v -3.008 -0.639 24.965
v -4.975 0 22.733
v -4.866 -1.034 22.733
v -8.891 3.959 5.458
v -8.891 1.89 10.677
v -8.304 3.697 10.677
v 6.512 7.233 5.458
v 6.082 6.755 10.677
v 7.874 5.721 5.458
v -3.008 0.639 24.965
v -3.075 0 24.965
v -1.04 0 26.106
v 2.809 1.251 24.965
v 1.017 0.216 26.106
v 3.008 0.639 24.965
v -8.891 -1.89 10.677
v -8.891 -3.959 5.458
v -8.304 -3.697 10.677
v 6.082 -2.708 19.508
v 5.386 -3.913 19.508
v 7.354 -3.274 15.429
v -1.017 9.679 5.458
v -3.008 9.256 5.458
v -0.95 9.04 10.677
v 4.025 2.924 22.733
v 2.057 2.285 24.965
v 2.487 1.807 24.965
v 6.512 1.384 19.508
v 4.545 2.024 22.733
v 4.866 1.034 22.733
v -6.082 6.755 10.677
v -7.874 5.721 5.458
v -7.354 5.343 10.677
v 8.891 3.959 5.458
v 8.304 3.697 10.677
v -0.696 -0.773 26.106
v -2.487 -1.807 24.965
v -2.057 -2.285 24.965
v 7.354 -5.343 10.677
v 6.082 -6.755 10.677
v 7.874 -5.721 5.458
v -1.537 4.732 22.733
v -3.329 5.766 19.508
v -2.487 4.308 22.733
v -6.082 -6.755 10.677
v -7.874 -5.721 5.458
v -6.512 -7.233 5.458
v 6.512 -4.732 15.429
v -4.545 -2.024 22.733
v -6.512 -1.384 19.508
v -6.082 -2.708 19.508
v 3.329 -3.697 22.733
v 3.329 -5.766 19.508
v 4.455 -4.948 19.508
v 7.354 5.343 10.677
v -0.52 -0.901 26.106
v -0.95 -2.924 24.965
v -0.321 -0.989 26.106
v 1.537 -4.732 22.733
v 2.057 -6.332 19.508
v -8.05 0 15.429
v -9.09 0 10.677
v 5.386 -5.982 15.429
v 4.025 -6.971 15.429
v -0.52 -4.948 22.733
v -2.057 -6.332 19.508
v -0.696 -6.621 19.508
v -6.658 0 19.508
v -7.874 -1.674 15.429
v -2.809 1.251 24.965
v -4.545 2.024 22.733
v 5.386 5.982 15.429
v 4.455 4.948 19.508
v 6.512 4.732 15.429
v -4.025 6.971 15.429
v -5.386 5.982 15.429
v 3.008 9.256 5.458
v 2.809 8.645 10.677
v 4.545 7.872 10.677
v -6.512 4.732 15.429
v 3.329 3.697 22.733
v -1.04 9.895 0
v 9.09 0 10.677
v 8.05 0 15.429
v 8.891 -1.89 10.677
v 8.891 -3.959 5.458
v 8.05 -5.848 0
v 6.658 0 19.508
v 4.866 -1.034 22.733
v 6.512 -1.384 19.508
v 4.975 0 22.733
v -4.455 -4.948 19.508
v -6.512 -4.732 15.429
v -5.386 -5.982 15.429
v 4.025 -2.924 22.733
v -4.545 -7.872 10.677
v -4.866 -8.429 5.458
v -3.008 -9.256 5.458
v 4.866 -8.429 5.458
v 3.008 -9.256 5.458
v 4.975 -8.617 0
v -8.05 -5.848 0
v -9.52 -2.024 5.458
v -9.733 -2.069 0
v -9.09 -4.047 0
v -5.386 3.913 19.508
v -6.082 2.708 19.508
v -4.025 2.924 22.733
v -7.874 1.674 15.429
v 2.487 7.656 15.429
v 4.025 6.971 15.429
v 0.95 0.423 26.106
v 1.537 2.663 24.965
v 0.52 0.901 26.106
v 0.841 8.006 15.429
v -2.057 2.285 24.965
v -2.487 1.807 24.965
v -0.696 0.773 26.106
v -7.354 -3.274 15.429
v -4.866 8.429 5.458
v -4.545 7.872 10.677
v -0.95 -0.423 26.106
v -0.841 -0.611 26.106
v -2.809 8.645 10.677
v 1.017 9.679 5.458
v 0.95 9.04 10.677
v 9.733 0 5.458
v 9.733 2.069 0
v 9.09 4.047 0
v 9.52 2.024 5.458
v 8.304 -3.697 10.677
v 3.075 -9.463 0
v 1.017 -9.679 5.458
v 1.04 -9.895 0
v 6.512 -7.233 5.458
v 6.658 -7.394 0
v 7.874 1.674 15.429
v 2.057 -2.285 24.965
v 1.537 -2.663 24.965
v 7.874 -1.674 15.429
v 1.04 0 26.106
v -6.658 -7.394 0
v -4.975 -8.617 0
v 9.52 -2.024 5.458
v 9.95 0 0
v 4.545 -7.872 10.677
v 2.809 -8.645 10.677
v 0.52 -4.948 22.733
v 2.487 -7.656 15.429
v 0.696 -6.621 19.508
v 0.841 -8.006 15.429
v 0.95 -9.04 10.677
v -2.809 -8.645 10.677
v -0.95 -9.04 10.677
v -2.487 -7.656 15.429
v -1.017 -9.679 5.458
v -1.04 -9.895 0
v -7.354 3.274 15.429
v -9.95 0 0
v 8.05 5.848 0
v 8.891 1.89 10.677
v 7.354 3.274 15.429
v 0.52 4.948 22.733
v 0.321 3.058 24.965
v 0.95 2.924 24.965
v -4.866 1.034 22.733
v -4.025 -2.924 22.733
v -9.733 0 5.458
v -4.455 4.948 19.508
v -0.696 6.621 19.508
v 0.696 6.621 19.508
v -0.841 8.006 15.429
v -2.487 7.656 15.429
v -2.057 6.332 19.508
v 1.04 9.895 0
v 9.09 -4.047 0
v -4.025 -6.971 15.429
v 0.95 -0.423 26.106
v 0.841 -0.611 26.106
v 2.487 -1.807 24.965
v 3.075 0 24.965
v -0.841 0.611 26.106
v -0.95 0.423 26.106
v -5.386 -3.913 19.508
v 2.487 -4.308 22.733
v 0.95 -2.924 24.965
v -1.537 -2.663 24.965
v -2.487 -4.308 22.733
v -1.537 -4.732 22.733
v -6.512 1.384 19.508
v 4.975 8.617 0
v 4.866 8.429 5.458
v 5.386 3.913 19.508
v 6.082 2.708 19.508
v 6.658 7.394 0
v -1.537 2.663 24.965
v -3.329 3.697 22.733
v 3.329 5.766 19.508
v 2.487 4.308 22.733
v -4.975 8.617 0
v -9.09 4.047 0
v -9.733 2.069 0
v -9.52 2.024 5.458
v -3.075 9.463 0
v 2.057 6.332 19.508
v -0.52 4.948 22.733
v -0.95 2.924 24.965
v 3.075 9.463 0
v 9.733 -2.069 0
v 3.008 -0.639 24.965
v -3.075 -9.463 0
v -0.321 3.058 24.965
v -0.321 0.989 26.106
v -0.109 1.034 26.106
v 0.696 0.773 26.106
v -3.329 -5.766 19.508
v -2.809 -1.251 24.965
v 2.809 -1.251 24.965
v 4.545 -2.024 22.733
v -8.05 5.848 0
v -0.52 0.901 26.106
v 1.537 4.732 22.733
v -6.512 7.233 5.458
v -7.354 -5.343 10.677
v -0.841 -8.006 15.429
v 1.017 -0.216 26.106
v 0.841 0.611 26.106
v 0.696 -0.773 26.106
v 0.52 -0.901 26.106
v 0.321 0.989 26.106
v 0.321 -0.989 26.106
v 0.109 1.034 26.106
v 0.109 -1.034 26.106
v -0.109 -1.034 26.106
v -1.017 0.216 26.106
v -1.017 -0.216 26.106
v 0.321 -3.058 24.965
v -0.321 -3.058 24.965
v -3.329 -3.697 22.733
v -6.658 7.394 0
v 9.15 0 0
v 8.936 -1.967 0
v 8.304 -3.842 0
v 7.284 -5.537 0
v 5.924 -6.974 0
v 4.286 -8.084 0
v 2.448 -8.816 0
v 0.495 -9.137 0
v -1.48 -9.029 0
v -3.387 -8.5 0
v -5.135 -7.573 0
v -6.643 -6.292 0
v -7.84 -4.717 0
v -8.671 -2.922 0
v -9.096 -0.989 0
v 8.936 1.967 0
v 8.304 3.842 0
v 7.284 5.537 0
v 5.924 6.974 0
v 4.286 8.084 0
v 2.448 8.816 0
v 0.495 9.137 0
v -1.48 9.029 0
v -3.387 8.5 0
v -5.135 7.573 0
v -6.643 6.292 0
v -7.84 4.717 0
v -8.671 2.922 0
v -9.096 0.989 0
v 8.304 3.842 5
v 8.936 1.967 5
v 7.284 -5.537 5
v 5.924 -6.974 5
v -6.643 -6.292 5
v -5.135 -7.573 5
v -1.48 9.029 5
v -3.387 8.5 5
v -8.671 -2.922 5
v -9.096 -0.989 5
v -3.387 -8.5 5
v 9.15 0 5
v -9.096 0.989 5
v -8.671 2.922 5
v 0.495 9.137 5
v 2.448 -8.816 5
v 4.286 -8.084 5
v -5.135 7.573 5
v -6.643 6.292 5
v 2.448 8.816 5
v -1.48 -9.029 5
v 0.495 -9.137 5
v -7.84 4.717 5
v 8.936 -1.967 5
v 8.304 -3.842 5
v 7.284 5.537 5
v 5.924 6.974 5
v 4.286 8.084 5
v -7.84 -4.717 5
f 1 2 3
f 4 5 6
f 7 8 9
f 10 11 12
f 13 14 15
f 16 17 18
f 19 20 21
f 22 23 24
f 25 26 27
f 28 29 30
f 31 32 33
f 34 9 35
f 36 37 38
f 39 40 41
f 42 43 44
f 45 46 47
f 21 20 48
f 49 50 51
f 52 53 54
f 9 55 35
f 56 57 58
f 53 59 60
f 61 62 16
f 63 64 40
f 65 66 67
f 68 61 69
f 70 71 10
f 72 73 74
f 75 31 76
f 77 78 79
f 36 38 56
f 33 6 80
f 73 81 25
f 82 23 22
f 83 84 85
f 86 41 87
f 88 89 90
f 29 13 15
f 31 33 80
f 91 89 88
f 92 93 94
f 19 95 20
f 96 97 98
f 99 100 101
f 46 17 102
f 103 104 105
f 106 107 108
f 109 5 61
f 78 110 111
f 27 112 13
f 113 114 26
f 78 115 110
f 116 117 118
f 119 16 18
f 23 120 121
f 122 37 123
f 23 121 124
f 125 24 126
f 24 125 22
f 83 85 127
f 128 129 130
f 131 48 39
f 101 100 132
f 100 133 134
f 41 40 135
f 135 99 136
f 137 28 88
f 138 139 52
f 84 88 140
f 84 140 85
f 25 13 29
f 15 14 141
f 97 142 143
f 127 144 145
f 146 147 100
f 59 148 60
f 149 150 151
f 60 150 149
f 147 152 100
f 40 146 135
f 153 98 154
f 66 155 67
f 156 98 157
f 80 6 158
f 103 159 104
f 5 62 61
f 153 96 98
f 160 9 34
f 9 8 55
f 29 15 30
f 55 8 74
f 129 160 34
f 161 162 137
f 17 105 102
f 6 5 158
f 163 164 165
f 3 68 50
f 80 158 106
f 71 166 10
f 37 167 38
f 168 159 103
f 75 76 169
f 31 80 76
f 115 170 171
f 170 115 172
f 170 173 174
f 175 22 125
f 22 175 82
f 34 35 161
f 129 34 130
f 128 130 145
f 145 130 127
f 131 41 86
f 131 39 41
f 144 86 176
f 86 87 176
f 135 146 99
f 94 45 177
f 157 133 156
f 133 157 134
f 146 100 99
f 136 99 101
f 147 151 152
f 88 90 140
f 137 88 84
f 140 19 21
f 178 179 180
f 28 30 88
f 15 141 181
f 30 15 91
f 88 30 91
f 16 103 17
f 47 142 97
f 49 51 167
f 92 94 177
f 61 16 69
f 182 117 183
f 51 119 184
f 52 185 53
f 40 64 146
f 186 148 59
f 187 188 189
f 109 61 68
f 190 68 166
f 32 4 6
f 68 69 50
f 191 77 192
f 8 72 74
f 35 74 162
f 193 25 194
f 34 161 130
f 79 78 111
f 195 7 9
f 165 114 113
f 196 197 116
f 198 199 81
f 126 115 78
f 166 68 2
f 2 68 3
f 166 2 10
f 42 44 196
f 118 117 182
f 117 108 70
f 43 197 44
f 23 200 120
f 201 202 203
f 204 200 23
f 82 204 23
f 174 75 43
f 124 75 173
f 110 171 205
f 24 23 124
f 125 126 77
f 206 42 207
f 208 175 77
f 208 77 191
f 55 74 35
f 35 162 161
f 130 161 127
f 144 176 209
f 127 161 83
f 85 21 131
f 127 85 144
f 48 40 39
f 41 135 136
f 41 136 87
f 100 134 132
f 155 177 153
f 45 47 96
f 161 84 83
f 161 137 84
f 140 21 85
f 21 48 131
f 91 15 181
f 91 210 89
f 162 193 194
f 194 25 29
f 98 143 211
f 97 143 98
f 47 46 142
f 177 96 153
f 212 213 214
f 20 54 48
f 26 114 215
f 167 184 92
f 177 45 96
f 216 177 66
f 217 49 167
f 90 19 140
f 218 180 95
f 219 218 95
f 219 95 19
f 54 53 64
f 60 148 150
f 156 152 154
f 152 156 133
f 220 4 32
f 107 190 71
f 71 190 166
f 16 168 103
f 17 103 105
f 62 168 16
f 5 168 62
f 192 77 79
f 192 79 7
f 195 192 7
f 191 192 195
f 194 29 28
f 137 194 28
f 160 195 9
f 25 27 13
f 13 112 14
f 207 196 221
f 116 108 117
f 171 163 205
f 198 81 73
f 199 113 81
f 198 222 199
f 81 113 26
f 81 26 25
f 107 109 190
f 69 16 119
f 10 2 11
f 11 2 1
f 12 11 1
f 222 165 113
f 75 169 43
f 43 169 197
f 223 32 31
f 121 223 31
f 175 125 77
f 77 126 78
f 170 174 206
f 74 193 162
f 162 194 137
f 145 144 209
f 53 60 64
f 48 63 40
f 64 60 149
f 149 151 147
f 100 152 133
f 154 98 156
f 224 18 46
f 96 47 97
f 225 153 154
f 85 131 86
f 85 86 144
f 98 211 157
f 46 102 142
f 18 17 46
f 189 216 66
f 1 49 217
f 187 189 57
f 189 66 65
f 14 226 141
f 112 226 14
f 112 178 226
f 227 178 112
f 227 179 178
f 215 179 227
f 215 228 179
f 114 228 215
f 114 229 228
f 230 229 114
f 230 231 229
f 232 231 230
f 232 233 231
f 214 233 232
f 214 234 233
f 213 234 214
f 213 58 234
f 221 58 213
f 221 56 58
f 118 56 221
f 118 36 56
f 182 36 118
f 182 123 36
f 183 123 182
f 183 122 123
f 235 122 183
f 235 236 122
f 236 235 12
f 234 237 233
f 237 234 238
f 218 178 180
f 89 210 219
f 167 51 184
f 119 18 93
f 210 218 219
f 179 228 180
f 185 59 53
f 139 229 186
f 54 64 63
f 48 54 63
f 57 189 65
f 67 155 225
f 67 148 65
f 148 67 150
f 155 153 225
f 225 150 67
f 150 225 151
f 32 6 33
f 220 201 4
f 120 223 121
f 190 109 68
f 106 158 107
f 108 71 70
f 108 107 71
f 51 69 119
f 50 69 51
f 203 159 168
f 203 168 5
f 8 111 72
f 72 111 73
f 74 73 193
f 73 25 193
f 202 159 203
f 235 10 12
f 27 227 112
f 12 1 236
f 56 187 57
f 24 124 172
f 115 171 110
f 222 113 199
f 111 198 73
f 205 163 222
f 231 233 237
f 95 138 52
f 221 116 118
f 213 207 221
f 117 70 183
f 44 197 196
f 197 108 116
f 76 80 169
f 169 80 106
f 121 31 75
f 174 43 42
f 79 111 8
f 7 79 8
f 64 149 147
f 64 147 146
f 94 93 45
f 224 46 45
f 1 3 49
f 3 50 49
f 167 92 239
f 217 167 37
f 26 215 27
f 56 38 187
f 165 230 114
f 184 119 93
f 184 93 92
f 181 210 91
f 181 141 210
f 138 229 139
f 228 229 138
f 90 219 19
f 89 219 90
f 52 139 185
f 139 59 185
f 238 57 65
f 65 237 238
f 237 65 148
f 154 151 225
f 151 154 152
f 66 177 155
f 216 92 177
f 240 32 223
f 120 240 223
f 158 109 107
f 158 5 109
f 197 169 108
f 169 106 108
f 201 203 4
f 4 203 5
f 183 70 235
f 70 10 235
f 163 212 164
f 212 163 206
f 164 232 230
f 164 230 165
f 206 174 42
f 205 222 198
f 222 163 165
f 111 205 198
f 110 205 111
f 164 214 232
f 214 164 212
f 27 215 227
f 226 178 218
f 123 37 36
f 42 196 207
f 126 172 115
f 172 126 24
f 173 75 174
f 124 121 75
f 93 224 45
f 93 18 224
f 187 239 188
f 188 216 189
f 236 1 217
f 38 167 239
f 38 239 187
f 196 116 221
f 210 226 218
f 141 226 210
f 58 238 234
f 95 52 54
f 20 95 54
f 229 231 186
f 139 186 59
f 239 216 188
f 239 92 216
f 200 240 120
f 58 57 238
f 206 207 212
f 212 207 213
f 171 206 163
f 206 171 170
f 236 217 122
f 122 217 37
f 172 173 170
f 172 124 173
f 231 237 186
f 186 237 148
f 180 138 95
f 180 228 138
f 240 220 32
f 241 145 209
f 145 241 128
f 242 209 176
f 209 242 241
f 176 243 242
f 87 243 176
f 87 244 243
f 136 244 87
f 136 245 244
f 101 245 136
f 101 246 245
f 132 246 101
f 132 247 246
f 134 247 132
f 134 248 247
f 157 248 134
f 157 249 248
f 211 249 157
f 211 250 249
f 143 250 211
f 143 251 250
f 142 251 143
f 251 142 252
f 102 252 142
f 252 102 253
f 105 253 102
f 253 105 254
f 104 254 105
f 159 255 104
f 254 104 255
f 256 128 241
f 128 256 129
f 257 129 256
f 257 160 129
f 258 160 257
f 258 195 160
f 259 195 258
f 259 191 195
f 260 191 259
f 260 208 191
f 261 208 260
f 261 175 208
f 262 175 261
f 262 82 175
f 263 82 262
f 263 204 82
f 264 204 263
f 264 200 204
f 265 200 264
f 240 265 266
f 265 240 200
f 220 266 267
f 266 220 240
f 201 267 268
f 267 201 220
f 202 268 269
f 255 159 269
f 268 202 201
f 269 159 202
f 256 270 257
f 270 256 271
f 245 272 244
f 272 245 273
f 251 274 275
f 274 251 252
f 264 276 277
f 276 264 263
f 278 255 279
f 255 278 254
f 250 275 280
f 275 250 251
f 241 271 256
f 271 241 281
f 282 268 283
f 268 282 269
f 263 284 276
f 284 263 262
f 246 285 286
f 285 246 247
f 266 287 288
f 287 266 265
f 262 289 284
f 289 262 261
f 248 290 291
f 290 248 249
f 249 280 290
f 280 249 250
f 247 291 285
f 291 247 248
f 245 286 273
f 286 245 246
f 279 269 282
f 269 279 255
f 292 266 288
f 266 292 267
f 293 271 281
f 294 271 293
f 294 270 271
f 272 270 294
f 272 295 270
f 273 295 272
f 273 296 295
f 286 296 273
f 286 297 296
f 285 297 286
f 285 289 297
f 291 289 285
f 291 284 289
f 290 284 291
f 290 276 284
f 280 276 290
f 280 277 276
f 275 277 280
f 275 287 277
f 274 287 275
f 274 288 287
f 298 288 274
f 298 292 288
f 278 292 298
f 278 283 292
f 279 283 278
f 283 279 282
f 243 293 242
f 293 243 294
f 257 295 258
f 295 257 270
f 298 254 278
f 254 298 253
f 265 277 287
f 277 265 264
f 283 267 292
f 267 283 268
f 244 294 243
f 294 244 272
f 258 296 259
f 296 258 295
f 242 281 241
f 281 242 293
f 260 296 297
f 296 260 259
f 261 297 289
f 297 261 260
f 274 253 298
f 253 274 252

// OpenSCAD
tol = 0.4;

engine_radius = 17.5 / 2;
engine_height = 70;

nose_assembly_height = 26.25;
nose_assembly_thickness = 1.2;
nose_assembly_slot_height = 5;
nose_assembly_radius = engine_radius + nose_assembly_thickness;

module a8_3_engine() {
  cylinder(engine_height, engine_radius + tol, engine_radius + tol);
}

module parabolic_cone(height, radius) {
  difference() {
    scale([1, 1, height / radius]) {
      sphere(radius);
    }

    translate([0, 0, -4 / 2 * radius]) {
      cube(4 * radius * [1, 1, 1], true);
    }
  }
}

difference() {
  // the nose cone
  parabolic_cone(nose_assembly_height, nose_assembly_radius);

  translate([0, 0, nose_assembly_slot_height]) {
    mirror([0, 0, 1]) {
      // the engine
      // remove the '#' that was in front of the cylinder()
      a8_3_engine()

      // the inner dome
      sphere(engine_radius + tol);
    }
  }
}
